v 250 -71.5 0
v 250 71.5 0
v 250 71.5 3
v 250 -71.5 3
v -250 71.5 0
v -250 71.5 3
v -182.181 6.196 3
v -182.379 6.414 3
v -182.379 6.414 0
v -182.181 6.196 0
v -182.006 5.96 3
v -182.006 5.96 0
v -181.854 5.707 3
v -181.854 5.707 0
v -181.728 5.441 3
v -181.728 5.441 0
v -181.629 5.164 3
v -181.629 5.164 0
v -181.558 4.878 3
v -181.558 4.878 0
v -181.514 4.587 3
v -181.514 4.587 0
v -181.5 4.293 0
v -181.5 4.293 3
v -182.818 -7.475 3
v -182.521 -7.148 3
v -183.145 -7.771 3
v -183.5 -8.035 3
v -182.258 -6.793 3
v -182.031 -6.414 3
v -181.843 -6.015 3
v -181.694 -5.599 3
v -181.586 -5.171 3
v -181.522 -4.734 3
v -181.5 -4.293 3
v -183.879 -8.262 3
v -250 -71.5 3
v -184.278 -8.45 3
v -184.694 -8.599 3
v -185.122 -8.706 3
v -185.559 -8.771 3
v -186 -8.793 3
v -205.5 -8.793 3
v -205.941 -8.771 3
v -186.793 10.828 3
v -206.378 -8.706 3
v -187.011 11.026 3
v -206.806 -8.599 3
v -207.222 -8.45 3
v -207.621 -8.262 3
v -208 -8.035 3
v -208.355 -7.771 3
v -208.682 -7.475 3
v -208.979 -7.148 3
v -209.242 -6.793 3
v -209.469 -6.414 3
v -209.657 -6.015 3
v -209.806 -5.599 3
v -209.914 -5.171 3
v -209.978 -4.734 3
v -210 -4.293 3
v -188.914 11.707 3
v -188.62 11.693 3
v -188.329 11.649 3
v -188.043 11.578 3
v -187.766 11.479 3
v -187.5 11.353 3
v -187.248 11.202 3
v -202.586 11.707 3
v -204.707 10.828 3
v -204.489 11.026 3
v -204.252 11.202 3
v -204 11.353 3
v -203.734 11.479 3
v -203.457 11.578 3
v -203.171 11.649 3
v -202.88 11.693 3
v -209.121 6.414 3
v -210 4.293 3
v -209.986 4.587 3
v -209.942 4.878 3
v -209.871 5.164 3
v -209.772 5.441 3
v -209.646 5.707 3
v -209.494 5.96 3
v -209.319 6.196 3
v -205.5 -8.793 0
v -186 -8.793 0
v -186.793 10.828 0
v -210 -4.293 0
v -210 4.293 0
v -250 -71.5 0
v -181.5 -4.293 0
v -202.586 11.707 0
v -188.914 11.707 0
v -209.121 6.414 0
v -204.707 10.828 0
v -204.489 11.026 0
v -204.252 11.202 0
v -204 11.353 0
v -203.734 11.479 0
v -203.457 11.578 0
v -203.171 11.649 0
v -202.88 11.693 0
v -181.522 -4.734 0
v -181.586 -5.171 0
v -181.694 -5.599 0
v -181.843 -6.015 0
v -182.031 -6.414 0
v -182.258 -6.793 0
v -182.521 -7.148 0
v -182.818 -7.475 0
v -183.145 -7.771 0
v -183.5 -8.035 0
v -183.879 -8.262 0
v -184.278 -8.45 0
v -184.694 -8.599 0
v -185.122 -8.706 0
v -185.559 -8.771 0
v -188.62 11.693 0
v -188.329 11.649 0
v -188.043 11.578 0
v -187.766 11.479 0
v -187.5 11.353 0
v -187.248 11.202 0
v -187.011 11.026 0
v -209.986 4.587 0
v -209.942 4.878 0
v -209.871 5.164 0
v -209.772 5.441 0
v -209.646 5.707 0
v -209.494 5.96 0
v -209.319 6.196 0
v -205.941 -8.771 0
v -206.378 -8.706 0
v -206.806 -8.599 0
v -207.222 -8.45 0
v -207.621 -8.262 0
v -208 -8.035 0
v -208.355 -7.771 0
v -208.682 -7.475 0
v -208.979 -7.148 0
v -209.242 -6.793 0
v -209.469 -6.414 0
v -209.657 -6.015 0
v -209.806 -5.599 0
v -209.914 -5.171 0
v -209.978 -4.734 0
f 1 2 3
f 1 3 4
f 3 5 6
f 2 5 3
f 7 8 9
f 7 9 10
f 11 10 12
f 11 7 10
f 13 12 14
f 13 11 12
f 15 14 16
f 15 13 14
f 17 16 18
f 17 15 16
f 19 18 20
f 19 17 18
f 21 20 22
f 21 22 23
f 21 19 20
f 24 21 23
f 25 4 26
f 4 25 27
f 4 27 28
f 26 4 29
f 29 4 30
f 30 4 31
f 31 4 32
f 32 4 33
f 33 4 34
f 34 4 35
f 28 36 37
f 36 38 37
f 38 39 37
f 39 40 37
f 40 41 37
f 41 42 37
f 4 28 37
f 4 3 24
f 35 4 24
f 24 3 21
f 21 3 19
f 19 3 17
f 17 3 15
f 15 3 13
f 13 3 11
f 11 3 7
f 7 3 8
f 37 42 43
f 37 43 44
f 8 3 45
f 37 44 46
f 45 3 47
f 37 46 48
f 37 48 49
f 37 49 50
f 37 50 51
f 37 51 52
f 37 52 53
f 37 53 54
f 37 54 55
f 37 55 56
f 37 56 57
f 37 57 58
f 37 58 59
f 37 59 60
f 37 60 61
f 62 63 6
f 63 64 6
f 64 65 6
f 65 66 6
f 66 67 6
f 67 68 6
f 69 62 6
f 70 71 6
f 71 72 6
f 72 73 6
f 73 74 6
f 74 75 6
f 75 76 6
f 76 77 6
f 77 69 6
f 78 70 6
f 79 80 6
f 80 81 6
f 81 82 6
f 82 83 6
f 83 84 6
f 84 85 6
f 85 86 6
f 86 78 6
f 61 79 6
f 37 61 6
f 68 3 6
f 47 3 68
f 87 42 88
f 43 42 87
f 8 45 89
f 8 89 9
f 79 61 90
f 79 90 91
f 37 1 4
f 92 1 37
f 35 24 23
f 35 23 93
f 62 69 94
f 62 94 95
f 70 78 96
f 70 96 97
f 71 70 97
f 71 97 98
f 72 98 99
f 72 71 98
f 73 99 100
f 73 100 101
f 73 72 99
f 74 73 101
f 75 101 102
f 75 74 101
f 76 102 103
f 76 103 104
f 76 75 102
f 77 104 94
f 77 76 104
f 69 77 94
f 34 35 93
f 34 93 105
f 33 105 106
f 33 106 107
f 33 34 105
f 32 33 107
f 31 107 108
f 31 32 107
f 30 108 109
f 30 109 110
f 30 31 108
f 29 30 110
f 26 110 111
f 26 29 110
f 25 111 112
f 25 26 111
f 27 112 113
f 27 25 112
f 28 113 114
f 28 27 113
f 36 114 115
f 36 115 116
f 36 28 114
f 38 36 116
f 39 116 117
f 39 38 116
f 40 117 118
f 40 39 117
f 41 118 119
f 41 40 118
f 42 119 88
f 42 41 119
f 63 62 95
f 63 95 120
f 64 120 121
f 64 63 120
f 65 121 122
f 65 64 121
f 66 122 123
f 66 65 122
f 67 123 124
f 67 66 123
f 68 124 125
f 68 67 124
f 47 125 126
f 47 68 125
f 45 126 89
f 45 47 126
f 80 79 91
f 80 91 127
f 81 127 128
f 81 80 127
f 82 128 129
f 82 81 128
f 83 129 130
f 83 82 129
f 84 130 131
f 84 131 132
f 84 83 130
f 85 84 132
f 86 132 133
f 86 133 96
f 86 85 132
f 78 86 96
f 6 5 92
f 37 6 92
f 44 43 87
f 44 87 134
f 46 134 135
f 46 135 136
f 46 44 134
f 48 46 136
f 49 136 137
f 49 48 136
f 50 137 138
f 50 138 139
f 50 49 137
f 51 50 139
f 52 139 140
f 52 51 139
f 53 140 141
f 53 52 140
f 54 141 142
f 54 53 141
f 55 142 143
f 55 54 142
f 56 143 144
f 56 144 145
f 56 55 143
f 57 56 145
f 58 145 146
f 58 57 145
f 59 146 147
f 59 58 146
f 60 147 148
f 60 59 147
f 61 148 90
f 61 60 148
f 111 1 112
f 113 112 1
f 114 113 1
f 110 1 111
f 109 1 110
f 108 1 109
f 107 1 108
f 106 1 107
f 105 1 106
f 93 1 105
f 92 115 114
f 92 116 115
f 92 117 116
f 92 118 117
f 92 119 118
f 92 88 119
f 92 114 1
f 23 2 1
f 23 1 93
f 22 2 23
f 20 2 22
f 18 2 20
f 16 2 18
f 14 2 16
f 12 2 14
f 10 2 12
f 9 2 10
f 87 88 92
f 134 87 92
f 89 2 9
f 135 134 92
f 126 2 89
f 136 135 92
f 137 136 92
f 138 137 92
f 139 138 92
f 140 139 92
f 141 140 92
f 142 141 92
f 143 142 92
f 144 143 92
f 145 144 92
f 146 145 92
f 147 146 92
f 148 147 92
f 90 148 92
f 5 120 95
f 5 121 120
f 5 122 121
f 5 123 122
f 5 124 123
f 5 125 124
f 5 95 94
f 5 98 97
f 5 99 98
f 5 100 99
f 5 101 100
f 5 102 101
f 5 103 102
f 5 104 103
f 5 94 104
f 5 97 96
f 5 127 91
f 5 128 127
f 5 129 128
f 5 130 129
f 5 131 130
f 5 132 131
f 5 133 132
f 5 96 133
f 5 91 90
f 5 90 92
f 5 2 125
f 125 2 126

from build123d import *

# Parameters (mm, degrees)
BOSS_EXTRUDE1_DEPTH = 3
CUT_EXTRUDE2_DEPTH  = 3


with BuildPart() as part:
    # Sketch1 → Boss-Extrude1 (new body)
    with BuildSketch(Plane.XY):
        Polygon((-250, -71.5), (-250, 68.5), (-250, 71.5), (250, 71.5), (250, -71.5), align=None)
    extrude(amount=BOSS_EXTRUDE1_DEPTH)

    # Sketch2 → Cut-Extrude2 (cut)
    with BuildSketch(Plane.XY.offset(3)):
        with BuildLine():
            Line((-186.792893219, 10.828427125), (-182.378679656, 6.414213562))
            ThreePointArc((-182.378679656, 6.414213562), (-181.728361402, 5.440943516), (-181.5, 4.292893219))
            Line((-181.5, 4.292893219), (-181.5, -4.292893219))
            ThreePointArc((-181.5, -4.292893219), (-182.818019485, -7.474873734), (-186, -8.792893219))
            Line((-186, -8.792893219), (-205.5, -8.792893219))
            ThreePointArc((-205.5, -8.792893219), (-208.681980515, -7.474873734), (-210, -4.292893219))
            Line((-210, -4.292893219), (-210, 4.292893219))
            ThreePointArc((-210, 4.292893219), (-209.771638598, 5.440943516), (-209.121320344, 6.414213562))
            Line((-209.121320344, 6.414213562), (-204.707106781, 10.828427125))
            ThreePointArc((-204.707106781, 10.828427125), (-203.733836735, 11.478745379), (-202.585786438, 11.707106781))
            Line((-202.585786438, 11.707106781), (-188.914213562, 11.707106781))
            ThreePointArc((-188.914213562, 11.707106781), (-187.766163265, 11.478745379), (-186.792893219, 10.828427125))
        make_face()
    extrude(amount=-CUT_EXTRUDE2_DEPTH, mode=Mode.SUBTRACT)


solid = part.part
